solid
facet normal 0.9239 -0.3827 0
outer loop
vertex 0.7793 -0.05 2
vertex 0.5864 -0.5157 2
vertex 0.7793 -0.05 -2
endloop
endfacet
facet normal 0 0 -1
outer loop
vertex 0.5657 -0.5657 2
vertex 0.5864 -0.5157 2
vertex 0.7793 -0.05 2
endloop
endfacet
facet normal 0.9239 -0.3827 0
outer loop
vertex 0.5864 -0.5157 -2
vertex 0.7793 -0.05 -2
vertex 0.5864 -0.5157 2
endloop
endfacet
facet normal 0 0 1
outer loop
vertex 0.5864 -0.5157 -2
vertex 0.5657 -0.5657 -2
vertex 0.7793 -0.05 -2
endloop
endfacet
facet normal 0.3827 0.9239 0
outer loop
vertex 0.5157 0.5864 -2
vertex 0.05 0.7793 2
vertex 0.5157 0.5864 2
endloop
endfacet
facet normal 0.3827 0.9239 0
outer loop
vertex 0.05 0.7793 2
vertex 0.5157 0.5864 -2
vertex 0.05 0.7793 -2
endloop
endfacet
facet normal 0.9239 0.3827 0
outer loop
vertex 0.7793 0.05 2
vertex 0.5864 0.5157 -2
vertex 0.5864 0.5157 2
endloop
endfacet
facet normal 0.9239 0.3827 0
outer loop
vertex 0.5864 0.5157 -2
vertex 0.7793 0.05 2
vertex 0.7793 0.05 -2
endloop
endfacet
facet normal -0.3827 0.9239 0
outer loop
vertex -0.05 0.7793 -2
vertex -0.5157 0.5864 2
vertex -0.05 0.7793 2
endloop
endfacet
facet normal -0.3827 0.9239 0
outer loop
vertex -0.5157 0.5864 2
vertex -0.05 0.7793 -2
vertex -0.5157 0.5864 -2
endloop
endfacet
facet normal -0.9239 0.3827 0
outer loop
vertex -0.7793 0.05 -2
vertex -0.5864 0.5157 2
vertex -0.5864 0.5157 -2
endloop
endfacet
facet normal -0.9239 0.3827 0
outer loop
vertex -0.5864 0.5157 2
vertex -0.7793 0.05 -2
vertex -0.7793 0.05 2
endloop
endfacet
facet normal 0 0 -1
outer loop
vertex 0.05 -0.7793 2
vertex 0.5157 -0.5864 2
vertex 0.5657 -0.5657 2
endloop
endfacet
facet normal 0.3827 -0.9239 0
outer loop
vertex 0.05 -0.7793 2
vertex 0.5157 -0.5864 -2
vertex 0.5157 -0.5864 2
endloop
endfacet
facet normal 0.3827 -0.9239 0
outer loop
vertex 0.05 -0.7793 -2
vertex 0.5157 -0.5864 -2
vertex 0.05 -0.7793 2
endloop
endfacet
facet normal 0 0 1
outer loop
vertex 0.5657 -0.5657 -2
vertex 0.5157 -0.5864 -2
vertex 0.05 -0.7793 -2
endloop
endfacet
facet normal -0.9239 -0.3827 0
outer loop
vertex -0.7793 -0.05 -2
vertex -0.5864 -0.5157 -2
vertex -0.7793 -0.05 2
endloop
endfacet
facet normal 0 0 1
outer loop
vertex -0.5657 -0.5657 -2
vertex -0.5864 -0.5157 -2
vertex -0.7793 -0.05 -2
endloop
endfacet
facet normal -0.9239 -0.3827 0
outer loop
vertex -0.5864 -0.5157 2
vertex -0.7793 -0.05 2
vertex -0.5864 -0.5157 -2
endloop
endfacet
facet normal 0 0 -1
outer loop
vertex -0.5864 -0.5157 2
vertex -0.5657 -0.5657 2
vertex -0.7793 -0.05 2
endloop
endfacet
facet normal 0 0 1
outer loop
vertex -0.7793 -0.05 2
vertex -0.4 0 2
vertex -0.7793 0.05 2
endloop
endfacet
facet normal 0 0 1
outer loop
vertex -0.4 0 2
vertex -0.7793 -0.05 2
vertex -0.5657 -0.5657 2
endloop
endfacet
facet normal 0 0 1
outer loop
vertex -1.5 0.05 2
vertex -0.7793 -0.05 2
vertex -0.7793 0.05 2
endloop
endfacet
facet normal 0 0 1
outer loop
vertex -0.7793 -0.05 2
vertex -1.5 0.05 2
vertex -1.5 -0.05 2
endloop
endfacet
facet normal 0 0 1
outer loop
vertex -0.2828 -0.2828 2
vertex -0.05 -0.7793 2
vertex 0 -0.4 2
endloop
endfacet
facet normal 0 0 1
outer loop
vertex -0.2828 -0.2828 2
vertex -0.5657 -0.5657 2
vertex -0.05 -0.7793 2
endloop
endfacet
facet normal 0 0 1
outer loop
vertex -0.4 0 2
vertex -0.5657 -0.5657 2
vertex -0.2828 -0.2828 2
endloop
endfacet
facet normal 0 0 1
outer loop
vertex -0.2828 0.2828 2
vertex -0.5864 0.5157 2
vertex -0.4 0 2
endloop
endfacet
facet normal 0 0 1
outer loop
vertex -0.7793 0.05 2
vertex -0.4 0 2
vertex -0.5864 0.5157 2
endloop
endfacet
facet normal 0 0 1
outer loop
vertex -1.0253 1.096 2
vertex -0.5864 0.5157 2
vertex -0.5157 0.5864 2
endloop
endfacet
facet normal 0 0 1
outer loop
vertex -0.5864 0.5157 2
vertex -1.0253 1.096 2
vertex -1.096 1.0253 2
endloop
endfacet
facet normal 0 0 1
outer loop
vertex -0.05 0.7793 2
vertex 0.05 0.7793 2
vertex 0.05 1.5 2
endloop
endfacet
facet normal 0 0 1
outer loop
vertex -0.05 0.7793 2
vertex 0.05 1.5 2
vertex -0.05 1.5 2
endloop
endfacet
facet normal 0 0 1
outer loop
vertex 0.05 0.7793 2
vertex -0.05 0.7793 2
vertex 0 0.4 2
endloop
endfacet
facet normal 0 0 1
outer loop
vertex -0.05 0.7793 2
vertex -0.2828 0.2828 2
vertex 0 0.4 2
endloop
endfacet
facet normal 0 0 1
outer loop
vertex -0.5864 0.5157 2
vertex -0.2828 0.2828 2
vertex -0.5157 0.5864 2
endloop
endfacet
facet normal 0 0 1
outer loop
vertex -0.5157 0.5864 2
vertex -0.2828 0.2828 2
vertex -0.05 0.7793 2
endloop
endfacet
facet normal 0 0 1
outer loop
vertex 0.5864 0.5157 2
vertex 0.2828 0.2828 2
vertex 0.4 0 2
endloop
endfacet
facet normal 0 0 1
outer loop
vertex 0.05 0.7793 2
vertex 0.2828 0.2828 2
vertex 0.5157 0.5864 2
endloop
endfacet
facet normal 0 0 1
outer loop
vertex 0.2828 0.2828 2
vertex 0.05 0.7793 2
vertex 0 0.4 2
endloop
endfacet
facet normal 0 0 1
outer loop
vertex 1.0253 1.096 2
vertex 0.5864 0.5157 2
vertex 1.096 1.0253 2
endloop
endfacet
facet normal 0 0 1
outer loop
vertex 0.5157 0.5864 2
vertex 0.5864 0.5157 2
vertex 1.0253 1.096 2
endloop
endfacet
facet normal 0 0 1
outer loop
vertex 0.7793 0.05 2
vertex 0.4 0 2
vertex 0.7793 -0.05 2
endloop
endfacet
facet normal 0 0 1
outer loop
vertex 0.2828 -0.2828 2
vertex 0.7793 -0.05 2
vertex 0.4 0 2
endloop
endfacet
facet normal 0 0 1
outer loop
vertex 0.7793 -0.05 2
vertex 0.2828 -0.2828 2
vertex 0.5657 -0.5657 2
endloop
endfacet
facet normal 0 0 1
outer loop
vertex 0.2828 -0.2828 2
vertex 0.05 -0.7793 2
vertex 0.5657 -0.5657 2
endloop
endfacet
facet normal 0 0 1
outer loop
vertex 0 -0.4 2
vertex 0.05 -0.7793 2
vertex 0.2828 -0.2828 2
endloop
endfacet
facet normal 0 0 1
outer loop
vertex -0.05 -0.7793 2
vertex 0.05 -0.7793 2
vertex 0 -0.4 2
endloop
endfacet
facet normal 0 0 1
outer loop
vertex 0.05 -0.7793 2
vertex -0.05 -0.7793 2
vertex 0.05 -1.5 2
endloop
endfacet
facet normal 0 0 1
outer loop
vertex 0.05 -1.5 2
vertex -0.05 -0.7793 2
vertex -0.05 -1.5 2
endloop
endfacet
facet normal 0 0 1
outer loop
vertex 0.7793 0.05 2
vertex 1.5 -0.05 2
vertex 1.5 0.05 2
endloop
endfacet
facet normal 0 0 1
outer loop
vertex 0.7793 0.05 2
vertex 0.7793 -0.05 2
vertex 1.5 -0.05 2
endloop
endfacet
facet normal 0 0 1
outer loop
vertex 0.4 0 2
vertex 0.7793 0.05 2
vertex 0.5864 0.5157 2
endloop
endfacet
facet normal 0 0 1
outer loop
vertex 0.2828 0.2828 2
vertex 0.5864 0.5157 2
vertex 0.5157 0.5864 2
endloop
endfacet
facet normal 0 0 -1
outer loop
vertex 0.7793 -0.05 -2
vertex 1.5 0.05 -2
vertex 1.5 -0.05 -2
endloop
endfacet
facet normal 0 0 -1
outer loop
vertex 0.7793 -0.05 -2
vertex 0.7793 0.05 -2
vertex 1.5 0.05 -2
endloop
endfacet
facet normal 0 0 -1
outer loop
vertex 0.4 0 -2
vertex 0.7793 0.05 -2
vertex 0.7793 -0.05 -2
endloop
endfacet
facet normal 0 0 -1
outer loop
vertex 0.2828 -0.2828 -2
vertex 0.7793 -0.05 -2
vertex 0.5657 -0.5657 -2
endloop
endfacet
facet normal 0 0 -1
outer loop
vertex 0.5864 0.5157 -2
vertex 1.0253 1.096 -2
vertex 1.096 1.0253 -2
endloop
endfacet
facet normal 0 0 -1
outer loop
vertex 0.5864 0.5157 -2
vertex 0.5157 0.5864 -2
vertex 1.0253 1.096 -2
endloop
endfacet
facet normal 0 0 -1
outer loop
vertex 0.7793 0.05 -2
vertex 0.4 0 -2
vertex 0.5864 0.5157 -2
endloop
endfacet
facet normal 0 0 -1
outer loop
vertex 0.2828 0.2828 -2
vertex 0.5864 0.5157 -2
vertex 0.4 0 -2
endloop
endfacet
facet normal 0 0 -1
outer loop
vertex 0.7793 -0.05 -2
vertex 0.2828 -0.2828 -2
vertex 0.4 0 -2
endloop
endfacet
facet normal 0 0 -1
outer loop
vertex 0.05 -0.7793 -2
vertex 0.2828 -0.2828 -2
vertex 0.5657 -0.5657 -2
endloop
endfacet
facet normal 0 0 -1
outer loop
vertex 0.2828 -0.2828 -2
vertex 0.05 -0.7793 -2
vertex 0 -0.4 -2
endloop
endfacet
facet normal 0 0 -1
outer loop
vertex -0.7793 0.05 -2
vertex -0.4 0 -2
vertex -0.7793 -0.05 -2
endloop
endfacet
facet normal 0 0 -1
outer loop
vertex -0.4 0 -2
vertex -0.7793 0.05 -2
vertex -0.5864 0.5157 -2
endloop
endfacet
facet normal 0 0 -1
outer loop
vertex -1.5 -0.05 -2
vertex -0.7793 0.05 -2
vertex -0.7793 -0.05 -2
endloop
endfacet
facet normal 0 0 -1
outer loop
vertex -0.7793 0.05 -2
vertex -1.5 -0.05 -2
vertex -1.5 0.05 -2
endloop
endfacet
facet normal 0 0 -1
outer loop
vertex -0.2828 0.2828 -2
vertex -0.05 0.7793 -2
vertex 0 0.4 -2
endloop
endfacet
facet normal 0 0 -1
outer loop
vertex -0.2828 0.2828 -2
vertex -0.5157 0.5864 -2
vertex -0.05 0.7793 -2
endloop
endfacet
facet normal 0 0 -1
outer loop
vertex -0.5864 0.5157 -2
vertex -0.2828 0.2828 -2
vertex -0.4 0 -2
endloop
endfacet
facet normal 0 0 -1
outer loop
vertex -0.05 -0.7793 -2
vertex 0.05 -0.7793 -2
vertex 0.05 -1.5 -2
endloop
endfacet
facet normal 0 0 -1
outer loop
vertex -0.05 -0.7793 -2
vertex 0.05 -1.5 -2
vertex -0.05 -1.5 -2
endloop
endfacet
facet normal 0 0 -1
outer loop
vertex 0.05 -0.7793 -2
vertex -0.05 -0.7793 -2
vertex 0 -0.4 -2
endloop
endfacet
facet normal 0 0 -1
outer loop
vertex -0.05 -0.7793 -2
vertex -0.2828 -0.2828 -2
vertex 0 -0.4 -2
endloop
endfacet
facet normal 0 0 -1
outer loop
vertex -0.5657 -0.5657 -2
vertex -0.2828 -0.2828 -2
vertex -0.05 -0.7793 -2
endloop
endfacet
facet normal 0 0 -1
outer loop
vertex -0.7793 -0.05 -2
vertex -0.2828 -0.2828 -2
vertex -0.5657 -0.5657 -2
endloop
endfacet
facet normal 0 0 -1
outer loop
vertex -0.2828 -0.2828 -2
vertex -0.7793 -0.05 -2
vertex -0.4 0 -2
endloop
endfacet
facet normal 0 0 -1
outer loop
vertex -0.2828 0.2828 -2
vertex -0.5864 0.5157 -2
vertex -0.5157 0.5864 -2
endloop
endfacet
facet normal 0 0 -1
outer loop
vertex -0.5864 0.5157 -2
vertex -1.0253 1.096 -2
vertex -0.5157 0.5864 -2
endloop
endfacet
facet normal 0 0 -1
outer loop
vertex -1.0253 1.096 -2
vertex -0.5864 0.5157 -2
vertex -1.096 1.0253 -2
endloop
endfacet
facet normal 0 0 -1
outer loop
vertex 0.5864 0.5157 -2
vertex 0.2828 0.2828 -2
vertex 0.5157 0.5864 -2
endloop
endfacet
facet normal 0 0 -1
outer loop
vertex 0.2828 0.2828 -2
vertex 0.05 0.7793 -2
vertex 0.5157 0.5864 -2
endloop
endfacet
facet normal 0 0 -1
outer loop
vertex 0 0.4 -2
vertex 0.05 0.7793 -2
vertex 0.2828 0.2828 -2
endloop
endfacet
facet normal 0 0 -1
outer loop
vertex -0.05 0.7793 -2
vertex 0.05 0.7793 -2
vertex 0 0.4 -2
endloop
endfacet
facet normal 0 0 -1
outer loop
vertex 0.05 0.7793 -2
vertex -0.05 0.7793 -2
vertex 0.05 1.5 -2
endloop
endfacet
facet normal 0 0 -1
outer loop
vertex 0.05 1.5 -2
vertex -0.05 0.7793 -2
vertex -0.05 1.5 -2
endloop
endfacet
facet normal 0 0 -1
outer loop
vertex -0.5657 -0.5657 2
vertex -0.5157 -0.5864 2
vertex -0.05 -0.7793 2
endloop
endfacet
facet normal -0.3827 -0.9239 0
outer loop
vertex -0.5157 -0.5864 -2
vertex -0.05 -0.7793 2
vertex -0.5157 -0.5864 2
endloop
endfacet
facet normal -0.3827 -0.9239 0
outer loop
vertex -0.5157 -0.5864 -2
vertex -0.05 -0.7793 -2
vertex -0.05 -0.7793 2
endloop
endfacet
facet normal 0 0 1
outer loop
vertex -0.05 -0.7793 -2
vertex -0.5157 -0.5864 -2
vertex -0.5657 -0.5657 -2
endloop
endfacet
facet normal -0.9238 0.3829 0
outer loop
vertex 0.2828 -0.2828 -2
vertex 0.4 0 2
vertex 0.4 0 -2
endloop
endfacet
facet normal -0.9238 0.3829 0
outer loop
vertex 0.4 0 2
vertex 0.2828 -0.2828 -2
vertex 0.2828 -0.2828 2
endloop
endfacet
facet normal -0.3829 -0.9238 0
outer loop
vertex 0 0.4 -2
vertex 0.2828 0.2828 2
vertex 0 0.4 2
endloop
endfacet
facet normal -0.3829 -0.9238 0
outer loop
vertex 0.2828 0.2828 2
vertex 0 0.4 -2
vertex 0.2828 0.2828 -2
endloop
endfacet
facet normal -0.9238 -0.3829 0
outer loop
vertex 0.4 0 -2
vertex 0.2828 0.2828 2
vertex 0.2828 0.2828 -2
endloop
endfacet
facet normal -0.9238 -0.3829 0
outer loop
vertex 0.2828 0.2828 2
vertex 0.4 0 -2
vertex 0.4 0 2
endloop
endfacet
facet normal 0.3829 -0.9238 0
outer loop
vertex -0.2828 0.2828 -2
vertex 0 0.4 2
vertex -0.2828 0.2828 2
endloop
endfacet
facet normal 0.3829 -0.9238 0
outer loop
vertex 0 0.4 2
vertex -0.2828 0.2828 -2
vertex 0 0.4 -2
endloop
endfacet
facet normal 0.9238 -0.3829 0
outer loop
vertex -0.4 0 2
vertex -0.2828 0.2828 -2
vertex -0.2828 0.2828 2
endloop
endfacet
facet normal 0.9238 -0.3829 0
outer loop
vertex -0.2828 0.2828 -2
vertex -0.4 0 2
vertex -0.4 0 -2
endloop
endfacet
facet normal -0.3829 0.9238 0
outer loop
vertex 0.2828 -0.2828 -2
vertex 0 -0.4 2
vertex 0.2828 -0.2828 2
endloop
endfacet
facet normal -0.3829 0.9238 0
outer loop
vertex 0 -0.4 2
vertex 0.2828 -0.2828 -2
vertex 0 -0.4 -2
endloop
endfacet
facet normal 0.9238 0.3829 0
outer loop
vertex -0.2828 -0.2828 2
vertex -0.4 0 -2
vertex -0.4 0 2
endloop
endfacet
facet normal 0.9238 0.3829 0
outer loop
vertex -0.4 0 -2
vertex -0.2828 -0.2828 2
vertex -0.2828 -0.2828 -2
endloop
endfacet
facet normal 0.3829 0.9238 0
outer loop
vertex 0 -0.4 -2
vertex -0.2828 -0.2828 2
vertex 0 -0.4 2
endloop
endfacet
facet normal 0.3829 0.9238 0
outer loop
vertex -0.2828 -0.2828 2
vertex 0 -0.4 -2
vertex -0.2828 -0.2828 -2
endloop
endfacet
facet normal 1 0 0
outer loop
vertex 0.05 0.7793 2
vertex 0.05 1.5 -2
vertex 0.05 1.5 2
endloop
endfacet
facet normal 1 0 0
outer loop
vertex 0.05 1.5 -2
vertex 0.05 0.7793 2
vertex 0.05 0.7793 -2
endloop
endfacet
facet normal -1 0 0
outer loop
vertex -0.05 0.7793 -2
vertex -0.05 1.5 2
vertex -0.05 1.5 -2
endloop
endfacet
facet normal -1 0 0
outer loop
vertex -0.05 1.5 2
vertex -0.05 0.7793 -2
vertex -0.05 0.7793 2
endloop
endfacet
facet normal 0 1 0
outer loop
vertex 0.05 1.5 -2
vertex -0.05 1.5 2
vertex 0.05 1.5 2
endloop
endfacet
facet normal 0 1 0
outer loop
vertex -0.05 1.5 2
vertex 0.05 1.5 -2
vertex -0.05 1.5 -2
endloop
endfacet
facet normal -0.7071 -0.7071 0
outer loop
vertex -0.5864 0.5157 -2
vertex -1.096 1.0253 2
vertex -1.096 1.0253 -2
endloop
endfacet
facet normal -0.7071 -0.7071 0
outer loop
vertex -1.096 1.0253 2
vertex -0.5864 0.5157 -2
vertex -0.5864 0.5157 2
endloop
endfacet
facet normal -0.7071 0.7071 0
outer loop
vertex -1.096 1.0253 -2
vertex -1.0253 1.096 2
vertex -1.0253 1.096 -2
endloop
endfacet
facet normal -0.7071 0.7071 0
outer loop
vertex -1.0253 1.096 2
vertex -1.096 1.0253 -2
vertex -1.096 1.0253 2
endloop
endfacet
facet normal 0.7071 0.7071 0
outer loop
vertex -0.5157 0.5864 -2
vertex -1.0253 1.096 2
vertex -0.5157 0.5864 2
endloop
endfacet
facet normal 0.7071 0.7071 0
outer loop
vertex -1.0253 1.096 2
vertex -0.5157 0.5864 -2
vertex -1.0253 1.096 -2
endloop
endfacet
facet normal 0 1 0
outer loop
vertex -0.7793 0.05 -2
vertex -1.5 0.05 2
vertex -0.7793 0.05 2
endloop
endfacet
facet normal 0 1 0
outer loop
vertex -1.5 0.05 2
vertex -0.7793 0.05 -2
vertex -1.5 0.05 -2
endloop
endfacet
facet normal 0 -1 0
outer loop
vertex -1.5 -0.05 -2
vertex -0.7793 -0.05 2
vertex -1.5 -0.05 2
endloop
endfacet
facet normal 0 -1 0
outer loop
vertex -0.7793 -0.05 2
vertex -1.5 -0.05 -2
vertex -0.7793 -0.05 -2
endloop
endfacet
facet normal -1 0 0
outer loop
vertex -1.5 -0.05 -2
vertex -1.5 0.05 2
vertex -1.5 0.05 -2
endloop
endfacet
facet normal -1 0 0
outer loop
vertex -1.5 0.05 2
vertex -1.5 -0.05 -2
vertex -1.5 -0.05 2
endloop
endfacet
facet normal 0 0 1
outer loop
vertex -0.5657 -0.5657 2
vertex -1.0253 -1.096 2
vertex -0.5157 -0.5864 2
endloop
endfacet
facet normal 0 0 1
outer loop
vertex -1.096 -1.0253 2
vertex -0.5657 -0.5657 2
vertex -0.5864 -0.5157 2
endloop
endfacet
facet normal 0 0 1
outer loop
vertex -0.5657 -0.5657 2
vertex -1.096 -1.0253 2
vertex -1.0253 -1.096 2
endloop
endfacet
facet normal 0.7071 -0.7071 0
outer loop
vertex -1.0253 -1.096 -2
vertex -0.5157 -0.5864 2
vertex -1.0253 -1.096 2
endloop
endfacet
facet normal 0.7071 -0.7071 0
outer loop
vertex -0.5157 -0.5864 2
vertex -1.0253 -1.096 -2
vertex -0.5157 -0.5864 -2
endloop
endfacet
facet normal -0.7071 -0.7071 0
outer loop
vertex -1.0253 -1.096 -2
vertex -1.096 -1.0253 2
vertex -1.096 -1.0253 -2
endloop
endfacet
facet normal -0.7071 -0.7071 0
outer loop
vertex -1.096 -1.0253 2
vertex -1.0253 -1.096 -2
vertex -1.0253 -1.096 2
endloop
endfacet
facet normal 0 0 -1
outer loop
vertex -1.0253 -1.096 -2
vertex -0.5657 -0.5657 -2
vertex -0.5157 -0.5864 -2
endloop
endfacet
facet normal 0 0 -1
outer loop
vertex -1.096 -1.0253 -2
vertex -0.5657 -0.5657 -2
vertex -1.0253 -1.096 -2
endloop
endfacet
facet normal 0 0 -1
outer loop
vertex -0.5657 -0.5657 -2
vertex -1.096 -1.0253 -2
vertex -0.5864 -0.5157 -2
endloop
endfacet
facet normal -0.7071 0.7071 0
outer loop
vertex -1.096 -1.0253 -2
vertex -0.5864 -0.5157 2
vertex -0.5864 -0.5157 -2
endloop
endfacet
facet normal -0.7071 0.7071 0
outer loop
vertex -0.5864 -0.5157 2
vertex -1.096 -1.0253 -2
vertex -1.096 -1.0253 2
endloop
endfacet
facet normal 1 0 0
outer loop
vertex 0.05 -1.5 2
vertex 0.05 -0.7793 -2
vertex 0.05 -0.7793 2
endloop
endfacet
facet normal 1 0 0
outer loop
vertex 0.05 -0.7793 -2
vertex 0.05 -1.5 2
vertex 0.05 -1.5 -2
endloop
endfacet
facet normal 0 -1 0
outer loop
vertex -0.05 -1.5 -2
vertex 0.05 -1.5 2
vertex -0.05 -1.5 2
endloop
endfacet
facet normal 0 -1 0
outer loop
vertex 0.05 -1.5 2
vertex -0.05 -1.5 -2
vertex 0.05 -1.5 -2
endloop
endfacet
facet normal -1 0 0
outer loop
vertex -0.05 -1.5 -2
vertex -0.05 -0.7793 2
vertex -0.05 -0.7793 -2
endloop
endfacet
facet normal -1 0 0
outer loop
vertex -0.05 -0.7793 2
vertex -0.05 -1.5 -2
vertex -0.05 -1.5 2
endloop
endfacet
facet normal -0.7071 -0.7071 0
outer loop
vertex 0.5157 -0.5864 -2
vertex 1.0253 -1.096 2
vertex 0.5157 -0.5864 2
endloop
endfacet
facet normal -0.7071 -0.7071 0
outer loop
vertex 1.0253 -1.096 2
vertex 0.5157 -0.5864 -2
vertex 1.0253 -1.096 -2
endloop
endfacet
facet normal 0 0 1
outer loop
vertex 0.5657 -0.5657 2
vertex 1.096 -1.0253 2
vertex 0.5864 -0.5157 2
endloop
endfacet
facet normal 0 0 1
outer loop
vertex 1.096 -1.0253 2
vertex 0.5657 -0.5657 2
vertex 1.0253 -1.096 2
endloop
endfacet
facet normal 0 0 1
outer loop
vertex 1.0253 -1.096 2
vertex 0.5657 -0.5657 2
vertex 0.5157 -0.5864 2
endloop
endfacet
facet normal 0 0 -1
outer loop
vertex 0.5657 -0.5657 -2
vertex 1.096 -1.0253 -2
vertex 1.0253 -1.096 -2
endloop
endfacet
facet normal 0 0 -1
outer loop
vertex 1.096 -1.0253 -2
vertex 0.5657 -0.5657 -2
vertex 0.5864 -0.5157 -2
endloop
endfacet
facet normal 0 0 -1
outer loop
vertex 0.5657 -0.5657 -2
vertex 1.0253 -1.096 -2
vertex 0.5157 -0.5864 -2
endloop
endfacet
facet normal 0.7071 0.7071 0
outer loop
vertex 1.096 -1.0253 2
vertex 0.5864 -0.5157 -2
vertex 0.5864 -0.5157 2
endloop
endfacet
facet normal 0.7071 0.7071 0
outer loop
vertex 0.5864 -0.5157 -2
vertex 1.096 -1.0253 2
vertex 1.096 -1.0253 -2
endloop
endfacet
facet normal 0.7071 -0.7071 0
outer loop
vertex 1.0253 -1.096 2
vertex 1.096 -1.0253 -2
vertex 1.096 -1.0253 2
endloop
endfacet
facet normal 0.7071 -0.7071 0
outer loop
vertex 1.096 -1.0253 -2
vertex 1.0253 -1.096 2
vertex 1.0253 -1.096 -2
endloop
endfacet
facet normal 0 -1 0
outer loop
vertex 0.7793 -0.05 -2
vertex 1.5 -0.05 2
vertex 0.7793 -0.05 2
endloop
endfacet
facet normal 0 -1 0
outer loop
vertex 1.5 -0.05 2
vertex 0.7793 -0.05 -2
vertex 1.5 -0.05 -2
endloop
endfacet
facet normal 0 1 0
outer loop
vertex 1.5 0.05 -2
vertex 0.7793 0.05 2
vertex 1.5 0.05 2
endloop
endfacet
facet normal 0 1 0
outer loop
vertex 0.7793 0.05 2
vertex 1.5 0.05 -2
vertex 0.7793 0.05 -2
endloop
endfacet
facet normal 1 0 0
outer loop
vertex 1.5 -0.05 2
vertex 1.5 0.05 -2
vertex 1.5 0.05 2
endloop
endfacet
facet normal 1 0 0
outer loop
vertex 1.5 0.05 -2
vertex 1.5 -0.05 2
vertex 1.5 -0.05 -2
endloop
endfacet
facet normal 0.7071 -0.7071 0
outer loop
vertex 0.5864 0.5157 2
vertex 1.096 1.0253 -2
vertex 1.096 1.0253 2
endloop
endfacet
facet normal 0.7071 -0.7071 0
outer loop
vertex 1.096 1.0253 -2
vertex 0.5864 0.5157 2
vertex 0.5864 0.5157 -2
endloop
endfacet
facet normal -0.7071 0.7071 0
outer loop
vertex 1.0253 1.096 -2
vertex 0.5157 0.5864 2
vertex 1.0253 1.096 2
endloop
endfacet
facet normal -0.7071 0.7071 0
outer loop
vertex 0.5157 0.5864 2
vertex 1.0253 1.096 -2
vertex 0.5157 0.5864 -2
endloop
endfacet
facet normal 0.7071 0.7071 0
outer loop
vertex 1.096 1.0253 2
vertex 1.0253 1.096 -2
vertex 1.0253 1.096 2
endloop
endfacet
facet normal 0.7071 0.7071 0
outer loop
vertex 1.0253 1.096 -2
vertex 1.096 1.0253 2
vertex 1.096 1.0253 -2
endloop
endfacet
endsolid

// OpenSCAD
paddles = 8;
difference() {
  cylinder(h = 4, r1 = .8, r2 = .8, center = true, $fn = paddles);
  cylinder(h = 5, r1 = .4, r2 = .4, center = true, $fn = paddles);
}

step = 360 / paddles;
for (index = [0:paddles - 1]) {
  rotate(index * step)
  translate([0, 1, 0])
  cube([.1, 1, 4], true);
}

//cube([3, .1, .1], true);
